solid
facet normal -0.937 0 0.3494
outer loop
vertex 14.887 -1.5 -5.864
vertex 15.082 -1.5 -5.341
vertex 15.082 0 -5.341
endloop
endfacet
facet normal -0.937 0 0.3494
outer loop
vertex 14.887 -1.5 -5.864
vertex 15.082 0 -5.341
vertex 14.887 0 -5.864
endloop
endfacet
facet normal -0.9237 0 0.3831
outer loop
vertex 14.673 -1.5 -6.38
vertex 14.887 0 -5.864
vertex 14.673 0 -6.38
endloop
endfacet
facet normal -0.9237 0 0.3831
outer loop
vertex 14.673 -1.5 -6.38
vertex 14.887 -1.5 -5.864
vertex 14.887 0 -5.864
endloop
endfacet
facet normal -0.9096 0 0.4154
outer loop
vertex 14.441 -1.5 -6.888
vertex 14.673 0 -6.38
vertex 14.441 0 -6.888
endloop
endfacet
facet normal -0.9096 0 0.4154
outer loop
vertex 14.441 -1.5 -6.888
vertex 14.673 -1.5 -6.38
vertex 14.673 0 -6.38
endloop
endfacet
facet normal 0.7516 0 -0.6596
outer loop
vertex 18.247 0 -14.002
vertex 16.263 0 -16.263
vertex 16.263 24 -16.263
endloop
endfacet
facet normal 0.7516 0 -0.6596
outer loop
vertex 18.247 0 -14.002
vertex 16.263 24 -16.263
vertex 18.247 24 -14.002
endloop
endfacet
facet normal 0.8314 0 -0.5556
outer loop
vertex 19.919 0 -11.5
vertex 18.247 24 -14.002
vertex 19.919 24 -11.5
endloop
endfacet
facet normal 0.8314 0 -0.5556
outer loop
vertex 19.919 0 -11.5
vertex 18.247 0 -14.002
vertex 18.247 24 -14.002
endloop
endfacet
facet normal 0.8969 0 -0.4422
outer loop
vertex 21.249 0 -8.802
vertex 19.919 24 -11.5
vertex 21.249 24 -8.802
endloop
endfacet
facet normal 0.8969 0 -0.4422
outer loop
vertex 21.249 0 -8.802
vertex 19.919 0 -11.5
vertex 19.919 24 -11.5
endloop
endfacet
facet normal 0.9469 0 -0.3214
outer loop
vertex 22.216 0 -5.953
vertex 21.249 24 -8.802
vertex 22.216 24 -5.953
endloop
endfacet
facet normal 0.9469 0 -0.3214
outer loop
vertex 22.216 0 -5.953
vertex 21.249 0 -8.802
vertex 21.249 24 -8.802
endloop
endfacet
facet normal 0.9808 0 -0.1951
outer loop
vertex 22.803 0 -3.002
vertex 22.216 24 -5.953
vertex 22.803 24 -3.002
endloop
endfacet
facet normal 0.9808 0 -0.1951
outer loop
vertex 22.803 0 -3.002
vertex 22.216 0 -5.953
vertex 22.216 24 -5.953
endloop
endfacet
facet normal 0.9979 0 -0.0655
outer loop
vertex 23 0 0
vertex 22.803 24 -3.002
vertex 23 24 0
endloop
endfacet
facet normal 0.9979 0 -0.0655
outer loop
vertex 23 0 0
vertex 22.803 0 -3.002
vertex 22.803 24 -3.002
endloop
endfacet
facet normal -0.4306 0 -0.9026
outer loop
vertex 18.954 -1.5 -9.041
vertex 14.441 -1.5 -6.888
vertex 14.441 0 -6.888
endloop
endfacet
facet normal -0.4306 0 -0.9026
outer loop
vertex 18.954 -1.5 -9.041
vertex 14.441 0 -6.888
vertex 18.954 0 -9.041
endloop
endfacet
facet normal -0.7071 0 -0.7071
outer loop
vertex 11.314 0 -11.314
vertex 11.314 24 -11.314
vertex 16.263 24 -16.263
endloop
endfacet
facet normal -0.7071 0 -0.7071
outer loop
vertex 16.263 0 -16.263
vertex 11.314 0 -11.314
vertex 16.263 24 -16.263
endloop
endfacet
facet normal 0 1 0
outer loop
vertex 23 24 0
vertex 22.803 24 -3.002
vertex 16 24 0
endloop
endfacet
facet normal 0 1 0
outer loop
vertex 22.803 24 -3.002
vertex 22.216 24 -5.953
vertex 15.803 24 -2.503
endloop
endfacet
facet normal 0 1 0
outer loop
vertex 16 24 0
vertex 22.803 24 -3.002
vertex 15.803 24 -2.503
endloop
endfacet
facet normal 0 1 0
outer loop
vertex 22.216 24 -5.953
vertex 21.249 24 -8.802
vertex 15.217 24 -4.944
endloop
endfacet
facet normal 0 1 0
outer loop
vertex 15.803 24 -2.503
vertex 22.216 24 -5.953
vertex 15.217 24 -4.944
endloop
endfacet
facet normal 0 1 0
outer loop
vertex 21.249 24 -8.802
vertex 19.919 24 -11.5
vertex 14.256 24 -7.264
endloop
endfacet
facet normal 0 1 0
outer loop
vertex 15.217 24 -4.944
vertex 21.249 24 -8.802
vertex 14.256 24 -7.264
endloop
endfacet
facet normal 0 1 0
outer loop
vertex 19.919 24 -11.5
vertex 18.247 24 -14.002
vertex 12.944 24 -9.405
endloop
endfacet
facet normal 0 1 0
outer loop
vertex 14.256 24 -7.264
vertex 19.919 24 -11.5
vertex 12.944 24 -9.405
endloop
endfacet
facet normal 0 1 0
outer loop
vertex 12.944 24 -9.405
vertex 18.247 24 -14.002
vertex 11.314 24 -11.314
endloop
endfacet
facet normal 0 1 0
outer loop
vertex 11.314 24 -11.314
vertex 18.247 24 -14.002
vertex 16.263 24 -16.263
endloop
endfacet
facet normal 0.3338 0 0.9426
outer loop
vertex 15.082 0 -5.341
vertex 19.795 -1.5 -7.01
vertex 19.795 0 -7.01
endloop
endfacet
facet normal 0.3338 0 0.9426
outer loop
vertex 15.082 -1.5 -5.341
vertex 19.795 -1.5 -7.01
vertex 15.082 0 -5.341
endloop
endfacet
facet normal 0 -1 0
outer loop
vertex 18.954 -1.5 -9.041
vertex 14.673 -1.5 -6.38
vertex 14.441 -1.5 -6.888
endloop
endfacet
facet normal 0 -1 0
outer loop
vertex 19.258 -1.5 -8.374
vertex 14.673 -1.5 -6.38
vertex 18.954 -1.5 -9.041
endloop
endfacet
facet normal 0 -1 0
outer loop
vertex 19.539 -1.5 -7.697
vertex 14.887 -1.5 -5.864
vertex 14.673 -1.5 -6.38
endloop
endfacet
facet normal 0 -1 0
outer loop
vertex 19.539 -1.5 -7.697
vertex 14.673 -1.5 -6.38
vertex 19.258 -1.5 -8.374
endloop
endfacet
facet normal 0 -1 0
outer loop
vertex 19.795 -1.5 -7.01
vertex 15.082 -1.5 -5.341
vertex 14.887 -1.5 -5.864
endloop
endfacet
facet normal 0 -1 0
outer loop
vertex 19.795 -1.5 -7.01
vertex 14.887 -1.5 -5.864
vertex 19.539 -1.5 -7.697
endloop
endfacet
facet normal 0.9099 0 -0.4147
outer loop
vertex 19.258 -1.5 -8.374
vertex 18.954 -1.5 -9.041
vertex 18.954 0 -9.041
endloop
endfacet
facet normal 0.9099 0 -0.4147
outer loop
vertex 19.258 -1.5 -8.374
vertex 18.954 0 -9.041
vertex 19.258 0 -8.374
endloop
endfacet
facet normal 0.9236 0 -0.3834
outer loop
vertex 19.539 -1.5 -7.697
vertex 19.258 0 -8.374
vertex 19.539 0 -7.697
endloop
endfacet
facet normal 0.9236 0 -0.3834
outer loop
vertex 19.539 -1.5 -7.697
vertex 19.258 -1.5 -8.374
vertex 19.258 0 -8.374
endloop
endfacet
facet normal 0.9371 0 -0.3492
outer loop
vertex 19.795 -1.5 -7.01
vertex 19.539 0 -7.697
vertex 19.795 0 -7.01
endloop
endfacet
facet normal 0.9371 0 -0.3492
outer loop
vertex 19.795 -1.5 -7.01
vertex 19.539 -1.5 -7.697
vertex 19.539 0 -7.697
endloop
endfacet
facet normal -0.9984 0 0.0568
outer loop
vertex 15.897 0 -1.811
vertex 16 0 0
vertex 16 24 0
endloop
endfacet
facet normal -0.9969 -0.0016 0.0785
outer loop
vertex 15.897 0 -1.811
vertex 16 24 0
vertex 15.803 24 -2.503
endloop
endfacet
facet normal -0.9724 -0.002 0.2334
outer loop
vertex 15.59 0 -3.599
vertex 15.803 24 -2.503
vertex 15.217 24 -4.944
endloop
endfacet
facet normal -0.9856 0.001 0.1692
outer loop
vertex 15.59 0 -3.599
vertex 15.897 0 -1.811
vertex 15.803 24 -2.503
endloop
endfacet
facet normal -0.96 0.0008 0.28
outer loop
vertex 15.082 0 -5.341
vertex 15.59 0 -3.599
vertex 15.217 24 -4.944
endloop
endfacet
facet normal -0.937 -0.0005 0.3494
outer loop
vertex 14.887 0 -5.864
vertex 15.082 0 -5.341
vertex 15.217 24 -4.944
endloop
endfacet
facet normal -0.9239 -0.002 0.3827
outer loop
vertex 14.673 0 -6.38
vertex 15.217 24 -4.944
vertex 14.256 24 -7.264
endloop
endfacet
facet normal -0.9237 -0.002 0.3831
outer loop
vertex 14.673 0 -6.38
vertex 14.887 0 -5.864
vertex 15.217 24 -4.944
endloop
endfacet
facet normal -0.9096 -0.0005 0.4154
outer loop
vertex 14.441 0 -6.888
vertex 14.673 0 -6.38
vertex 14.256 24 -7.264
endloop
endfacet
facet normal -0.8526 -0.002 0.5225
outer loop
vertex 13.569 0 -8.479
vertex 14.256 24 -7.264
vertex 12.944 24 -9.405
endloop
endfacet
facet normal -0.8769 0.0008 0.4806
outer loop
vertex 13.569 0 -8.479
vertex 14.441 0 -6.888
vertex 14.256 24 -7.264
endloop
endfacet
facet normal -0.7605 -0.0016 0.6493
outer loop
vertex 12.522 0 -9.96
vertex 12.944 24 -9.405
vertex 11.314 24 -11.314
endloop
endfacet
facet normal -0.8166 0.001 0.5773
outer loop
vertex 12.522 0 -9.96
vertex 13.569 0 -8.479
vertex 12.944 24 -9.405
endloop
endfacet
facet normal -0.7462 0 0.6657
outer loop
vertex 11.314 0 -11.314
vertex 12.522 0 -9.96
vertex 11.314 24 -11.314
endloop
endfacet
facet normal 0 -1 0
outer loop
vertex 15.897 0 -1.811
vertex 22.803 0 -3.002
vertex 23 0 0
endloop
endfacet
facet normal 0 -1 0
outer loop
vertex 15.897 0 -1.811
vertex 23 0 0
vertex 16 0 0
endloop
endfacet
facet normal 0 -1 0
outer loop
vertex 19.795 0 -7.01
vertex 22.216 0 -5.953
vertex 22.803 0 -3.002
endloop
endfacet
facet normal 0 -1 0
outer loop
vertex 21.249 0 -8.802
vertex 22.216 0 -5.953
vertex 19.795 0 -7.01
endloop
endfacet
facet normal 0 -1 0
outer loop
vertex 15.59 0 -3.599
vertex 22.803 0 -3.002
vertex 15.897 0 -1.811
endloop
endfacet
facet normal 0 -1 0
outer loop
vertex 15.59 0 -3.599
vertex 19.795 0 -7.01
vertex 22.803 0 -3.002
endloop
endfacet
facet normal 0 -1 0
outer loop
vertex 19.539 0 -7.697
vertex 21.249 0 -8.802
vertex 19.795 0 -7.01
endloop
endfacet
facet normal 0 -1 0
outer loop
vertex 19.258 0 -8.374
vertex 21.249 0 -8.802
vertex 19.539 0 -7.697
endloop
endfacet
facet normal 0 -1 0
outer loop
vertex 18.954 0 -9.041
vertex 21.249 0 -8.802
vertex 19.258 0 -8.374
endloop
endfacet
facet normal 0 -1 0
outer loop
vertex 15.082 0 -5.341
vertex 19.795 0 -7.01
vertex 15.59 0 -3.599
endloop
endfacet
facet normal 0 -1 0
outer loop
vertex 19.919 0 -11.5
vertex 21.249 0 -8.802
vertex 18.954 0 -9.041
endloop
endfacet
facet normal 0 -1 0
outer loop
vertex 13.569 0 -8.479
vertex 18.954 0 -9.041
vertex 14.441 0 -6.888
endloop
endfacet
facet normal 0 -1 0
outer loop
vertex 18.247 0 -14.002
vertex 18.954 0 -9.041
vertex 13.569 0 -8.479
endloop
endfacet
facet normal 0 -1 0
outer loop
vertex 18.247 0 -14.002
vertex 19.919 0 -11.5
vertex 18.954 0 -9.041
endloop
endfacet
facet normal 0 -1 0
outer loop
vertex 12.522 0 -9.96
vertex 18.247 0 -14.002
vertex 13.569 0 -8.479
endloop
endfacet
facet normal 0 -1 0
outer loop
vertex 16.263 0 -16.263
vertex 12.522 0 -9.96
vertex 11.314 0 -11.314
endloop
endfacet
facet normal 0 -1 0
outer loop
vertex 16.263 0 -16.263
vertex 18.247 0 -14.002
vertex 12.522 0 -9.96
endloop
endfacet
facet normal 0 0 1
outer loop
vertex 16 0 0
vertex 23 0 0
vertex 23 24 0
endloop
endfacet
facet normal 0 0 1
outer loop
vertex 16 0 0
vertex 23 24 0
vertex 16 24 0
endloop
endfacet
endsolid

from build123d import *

# Parameters (mm, degrees)
BOSS_EXTRUDE1_DEPTH = 24
BOSS_EXTRUDE2_START = 1.5
BOSS_EXTRUDE2_DEPTH = 1.5


with BuildPart() as part:
    # Sketch1 → Boss-Extrude1 (new body)
    with BuildSketch(Plane(origin=(0, 0, 0), x_dir=(1, 0, 0), z_dir=(0, 1, 0))):
        with BuildLine():
            Line((11.313708499, 11.313708499), (16.263455967, 16.263455967))
            ThreePointArc((16.263455967, 16.263455967), (21.249229248, 8.801718944), (23, 0))
            Line((23, 0), (16, 0))
            ThreePointArc((16, 0), (14.78207252, 6.122934918), (11.313708499, 11.313708499))
        make_face()
    extrude(amount=BOSS_EXTRUDE1_DEPTH)

    # Sketch4 → Boss-Extrude2 (add)
    with BuildSketch(Plane.XZ.offset(BOSS_EXTRUDE2_START)):
        with BuildLine():
            Line((14.44136455, -6.888177549), (18.954290971, -9.040733033))
            ThreePointArc((18.954290971, -9.040733033), (19.401470183, -8.03635208), (19.795471313, -7.009944044))
            Line((19.795471313, -7.009944044), (15.082263857, -5.340909748))
            ThreePointArc((15.082263857, -5.340909748), (14.78207252, -6.122934918), (14.44136455, -6.888177549))
        make_face()
    extrude(amount=-BOSS_EXTRUDE2_DEPTH)


solid = part.part
